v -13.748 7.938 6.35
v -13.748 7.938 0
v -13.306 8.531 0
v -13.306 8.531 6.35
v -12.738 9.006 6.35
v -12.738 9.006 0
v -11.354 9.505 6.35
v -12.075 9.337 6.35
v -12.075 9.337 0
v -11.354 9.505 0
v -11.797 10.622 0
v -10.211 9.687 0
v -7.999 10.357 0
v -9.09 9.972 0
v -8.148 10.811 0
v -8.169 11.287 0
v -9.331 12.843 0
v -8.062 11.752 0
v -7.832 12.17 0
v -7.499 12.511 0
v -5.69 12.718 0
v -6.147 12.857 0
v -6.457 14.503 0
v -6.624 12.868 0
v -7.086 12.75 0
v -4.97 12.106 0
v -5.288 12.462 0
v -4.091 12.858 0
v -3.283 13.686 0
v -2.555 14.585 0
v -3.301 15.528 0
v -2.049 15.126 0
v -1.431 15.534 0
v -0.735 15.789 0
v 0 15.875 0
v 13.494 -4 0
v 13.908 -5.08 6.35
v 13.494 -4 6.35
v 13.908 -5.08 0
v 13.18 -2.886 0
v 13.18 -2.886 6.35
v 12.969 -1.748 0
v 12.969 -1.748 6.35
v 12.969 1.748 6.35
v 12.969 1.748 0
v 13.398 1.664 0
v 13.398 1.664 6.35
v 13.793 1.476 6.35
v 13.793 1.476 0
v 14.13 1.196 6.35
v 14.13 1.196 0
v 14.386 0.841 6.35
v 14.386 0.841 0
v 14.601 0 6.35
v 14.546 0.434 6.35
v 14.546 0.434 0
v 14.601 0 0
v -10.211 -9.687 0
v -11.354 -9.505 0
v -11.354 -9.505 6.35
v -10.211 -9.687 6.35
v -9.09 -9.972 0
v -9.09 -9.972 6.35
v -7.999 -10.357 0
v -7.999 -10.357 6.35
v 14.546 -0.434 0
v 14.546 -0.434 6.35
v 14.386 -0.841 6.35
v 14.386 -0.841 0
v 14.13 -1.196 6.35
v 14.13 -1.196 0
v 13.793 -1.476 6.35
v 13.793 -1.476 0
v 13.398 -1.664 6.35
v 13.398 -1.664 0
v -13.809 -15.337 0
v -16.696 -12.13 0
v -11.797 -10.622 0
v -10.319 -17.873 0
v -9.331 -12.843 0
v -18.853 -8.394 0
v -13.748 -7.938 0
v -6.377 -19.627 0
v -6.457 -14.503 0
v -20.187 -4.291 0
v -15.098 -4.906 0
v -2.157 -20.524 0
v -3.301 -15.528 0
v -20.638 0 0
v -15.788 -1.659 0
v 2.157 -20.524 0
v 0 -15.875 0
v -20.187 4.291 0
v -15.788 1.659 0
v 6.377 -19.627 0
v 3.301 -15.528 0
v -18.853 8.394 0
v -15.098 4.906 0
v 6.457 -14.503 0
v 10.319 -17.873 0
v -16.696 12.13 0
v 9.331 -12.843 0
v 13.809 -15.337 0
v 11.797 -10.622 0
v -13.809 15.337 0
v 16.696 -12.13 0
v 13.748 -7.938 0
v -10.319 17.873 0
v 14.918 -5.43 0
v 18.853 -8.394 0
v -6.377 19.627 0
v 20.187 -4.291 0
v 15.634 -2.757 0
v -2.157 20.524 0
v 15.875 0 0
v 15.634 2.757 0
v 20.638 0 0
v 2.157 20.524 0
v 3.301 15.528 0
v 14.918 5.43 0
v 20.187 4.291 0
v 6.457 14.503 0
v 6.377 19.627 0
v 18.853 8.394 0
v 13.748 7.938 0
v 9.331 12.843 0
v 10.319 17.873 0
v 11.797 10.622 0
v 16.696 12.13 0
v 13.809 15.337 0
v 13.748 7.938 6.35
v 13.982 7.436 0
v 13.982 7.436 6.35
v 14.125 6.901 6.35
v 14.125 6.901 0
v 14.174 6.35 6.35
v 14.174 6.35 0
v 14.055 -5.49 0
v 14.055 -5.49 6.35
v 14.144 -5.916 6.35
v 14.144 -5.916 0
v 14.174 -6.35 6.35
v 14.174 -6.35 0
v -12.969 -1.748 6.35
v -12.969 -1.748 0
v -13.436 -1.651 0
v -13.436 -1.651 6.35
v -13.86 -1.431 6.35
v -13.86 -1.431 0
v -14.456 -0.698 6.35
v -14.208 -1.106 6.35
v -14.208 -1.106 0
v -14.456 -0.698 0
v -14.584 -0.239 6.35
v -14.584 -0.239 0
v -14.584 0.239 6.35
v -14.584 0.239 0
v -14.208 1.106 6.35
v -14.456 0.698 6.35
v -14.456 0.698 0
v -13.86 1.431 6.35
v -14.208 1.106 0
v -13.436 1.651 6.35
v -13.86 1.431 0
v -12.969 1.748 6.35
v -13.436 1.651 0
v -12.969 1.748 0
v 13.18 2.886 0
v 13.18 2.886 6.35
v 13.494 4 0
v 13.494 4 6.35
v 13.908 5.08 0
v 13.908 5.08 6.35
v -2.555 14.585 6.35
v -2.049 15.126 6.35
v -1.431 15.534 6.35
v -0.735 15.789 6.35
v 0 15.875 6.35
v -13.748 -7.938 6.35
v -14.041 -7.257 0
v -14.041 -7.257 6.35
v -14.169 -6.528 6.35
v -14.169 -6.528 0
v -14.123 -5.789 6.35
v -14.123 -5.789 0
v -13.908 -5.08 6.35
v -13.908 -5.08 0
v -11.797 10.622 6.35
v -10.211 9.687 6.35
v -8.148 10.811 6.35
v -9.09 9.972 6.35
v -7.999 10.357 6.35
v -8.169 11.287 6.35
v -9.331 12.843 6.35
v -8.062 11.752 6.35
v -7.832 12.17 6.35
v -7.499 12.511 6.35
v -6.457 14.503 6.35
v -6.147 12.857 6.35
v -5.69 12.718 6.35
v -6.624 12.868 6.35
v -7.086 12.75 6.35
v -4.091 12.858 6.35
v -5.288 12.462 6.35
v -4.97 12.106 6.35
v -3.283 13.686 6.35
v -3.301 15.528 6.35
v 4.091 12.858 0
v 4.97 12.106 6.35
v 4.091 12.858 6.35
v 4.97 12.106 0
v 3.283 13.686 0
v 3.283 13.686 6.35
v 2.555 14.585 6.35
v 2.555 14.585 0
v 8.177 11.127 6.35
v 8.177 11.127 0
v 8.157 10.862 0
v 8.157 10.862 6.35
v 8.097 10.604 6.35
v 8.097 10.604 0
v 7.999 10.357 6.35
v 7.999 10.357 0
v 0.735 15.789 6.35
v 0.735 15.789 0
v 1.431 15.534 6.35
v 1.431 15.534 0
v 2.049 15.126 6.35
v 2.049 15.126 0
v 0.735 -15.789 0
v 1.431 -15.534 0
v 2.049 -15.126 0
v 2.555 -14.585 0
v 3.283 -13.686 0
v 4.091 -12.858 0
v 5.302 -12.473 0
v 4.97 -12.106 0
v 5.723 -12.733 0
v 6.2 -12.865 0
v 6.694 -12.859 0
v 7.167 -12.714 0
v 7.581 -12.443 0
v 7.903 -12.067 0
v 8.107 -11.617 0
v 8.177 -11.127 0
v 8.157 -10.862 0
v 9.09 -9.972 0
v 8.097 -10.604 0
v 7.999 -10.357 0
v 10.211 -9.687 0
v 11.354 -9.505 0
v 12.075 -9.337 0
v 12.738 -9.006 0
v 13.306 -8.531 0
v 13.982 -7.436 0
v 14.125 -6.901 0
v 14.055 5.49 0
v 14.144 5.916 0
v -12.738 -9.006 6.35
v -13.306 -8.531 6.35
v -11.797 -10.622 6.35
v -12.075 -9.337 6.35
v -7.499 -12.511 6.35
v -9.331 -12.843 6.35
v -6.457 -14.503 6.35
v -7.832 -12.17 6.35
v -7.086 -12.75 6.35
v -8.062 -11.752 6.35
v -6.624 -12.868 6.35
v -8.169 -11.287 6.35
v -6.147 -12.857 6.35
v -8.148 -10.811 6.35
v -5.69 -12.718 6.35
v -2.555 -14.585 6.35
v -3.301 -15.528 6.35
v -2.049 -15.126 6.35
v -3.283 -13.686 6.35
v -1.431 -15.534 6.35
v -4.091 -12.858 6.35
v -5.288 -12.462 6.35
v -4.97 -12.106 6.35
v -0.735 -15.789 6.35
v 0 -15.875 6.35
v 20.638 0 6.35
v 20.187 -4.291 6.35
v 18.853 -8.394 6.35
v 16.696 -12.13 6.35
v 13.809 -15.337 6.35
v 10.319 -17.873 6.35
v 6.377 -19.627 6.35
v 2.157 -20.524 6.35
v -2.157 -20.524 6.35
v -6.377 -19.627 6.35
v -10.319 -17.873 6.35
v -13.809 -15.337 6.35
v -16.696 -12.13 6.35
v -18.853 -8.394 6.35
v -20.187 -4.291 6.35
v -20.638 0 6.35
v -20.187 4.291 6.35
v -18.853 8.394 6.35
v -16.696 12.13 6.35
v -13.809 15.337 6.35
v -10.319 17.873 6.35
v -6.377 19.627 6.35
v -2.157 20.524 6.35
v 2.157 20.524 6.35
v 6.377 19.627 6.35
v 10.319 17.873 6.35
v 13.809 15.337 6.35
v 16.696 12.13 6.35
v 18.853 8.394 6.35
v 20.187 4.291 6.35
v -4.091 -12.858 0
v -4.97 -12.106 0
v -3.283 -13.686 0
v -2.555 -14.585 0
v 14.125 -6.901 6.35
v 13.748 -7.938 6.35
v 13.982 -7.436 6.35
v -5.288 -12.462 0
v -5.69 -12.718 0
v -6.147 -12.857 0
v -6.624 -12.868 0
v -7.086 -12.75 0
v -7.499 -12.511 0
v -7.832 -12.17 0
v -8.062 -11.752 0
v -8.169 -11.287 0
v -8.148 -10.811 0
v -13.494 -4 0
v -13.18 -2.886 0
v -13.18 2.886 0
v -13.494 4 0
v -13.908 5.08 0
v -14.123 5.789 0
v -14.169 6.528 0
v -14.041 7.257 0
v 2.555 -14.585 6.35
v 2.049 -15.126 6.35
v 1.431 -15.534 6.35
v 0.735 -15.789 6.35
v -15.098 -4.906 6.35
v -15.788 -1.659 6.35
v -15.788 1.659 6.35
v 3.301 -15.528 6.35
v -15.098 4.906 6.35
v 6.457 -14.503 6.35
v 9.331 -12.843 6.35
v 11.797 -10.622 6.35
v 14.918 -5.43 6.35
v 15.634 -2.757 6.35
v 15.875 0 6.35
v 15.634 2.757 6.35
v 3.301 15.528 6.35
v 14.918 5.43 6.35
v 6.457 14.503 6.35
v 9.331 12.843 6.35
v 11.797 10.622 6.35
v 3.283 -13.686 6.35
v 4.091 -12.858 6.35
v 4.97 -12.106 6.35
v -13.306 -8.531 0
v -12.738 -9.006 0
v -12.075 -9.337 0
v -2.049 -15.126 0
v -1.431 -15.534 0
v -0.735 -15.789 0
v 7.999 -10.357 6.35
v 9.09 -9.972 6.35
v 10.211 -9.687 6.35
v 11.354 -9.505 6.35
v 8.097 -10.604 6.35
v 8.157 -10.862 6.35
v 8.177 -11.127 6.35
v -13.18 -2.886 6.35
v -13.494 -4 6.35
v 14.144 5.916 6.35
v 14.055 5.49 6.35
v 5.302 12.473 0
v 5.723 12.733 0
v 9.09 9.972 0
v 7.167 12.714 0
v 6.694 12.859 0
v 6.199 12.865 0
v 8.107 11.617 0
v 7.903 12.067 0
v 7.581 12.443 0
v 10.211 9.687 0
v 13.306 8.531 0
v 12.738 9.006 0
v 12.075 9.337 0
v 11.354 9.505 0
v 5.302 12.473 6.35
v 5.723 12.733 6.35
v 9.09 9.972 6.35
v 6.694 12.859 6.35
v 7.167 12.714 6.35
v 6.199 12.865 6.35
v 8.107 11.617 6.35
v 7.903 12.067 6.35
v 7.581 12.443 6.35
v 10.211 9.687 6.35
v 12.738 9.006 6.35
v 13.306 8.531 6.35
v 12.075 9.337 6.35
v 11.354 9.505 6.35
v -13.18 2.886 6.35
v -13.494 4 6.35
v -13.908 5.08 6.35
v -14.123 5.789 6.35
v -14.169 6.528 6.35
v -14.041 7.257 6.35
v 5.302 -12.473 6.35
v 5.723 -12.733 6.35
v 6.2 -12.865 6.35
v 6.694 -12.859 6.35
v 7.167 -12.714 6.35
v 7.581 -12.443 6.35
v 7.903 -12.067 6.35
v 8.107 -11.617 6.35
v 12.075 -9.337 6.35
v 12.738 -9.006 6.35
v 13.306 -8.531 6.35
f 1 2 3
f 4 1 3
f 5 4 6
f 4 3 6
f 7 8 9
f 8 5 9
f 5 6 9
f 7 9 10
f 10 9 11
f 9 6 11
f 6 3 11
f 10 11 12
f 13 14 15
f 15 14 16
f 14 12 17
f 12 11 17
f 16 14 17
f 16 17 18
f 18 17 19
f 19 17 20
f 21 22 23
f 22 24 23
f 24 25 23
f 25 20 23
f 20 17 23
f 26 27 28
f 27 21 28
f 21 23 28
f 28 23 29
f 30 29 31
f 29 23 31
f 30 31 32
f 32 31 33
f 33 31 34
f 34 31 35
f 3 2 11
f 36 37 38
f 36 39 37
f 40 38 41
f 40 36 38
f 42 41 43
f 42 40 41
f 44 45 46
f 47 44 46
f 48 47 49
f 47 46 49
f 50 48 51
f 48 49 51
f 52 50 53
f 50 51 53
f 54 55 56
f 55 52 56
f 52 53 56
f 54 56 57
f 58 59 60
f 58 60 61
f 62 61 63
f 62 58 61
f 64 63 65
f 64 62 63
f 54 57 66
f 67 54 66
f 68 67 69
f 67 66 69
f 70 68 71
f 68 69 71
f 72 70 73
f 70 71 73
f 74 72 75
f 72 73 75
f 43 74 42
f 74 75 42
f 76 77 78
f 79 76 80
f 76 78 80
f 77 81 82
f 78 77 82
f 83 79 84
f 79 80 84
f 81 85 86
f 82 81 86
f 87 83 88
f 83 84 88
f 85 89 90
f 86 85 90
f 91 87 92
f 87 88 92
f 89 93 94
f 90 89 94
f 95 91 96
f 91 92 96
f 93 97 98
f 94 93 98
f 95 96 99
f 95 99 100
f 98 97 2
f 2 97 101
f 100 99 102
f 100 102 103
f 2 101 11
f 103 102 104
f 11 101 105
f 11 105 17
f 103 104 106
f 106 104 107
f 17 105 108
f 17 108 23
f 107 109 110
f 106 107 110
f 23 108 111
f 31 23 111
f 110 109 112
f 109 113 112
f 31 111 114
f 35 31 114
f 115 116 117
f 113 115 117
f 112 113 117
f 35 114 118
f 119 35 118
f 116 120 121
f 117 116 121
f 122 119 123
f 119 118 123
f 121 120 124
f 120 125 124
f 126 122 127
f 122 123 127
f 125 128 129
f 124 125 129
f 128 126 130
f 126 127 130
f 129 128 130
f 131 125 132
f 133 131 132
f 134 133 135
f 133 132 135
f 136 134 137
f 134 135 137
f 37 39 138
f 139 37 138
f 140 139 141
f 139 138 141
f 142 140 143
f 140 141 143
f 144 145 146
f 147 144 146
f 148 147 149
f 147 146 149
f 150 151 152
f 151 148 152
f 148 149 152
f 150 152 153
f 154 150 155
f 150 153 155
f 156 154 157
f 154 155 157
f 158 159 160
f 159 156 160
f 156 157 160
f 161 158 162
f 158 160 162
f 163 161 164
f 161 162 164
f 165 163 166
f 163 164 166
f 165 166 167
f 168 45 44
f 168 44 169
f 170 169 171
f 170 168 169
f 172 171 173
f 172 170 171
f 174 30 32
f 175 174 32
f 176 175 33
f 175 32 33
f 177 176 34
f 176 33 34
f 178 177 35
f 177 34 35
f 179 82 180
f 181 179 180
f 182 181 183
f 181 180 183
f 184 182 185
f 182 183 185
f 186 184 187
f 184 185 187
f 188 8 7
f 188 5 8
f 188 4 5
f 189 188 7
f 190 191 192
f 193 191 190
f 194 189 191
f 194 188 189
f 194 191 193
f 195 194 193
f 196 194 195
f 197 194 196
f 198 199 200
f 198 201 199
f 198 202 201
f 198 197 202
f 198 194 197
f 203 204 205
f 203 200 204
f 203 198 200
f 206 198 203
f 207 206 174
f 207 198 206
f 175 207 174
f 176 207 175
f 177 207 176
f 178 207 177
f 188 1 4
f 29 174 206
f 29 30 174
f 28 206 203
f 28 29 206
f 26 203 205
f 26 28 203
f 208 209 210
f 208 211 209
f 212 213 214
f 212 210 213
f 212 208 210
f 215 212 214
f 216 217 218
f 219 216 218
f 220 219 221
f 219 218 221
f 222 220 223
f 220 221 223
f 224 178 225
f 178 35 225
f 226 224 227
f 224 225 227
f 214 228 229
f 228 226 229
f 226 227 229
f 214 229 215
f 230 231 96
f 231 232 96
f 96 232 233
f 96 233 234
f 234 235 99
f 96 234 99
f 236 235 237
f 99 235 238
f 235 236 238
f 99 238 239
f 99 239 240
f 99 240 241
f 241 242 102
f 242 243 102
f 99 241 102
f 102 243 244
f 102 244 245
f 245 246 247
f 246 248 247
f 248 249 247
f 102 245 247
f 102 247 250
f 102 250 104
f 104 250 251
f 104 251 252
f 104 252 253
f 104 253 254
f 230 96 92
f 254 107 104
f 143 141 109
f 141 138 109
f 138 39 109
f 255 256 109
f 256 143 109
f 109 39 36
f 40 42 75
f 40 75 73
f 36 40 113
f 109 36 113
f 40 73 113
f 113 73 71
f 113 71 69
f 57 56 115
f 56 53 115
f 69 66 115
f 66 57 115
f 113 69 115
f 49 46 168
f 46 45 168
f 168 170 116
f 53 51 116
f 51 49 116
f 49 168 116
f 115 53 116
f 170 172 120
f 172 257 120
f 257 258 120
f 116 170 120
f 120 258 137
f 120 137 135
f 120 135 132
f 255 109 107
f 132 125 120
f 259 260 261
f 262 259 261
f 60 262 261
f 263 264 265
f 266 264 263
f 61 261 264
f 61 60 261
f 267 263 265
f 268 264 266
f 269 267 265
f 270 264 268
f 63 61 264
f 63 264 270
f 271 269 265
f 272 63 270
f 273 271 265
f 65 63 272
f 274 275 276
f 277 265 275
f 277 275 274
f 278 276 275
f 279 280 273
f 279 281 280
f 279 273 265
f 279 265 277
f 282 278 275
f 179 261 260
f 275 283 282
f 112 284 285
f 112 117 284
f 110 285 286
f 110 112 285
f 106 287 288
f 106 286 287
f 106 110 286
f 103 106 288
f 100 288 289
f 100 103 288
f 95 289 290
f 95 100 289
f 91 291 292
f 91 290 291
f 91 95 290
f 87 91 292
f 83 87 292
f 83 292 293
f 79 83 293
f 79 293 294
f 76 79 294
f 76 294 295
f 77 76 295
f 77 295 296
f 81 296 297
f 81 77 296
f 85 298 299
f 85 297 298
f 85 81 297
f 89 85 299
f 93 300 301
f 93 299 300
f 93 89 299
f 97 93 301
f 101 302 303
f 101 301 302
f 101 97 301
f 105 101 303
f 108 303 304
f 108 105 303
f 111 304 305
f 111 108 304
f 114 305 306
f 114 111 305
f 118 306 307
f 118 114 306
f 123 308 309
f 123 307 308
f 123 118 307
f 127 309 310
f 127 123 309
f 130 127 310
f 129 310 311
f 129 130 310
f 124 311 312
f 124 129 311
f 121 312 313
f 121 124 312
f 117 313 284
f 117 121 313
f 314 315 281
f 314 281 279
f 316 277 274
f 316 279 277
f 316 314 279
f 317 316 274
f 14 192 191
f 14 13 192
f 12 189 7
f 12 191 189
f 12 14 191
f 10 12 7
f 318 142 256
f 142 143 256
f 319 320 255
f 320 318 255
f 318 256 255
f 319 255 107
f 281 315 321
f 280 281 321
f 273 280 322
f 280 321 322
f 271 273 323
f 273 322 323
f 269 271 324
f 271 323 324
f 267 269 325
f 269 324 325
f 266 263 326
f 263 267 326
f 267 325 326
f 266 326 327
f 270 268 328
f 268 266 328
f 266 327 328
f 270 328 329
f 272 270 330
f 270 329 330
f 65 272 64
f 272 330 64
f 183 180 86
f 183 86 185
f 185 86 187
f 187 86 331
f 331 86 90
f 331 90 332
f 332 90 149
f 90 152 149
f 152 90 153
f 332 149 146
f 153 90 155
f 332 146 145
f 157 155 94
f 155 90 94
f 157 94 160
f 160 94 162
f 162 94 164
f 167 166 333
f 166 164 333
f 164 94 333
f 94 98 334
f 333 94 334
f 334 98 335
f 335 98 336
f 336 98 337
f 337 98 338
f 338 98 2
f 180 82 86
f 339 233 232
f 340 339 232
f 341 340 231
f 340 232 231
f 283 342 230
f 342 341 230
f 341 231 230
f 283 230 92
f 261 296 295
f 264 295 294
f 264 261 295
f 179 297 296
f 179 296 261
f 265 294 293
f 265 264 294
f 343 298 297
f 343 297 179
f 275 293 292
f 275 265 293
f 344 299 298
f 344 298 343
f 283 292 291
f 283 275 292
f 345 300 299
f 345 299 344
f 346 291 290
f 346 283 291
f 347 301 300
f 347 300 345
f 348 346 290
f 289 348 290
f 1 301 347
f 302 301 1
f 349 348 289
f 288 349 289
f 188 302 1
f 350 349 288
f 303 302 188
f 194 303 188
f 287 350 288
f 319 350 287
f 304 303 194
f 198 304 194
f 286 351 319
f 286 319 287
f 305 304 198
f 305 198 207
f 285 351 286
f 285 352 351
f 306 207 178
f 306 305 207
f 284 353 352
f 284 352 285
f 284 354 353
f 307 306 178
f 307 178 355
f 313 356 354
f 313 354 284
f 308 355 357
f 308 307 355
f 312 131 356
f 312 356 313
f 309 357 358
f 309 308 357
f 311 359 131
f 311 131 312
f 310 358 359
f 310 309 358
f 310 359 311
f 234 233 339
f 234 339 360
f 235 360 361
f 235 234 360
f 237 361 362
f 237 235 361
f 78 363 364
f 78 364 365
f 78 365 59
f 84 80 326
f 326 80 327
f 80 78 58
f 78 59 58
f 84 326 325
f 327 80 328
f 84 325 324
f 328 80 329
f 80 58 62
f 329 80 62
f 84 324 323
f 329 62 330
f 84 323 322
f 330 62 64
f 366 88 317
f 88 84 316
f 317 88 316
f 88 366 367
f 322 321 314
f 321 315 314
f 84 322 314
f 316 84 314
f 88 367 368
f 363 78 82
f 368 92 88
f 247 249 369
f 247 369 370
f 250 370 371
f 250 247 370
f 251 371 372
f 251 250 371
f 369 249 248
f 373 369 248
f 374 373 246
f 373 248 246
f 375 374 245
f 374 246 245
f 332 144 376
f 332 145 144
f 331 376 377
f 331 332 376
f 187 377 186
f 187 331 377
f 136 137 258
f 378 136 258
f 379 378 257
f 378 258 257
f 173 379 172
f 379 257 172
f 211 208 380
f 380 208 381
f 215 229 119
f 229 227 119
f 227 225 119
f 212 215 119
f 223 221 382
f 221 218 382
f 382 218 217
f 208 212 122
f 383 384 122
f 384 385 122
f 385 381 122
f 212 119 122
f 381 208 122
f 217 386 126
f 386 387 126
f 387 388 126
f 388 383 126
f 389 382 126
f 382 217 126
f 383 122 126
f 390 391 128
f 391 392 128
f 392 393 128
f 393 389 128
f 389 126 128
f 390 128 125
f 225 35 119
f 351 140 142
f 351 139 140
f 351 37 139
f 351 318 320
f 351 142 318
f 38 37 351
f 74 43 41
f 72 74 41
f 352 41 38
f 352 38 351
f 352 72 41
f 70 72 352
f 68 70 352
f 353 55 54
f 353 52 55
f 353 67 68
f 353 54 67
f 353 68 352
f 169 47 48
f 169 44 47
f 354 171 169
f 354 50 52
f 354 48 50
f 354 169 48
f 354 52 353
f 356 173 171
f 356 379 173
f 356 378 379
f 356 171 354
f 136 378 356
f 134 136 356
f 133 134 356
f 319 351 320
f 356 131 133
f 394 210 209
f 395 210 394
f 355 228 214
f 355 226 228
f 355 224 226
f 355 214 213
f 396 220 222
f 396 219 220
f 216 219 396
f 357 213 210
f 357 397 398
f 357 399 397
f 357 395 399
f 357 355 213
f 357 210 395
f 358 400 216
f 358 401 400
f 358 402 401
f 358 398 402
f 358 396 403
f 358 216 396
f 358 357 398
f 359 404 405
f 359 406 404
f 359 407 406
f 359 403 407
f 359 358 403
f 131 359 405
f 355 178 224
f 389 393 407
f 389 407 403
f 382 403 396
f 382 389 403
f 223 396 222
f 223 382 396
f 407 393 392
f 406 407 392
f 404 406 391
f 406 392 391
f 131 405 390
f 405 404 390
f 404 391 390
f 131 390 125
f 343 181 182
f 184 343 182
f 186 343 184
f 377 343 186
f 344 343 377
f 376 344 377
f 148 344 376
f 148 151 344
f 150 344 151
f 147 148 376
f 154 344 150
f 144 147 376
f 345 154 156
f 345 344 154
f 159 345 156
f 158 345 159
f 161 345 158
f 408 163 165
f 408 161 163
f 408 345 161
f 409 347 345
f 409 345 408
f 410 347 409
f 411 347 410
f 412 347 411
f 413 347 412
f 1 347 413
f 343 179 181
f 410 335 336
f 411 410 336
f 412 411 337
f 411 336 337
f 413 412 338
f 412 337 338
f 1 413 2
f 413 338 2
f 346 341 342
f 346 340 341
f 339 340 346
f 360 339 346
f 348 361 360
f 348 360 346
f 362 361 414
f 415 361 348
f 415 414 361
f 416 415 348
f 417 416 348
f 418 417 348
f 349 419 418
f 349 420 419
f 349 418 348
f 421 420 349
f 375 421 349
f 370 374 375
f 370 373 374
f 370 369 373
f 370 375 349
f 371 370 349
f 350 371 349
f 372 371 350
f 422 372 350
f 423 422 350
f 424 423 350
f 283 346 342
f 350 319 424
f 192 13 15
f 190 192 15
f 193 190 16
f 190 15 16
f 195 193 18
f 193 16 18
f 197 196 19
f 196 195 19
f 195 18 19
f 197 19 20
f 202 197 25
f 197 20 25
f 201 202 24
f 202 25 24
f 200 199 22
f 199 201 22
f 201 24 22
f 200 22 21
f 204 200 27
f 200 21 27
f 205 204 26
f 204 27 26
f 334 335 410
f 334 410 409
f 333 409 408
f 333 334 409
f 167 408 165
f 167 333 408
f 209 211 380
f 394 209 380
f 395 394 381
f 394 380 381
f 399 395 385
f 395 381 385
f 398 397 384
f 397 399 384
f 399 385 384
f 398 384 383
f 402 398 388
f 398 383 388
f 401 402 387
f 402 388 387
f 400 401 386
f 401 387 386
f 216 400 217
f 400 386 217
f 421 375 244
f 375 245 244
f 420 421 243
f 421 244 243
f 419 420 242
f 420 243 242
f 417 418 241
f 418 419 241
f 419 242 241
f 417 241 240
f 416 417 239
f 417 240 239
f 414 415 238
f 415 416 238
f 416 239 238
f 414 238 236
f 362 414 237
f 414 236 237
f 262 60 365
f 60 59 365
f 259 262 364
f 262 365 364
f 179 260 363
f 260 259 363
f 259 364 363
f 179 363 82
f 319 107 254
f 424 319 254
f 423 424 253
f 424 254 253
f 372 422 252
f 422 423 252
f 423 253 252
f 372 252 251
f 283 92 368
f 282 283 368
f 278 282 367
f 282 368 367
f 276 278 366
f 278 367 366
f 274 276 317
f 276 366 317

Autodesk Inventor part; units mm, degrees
ref_plane "YZ Plane" through (0, 0, 0) normal (1, 0, 0) x (0, 1, 0)
ref_plane "XZ Plane" through (0, 0, 0) normal (0, 1, 0) x (-1, 0, 0)
ref_plane "XY Plane" through (0, 0, 0) normal (0, 0, 1) x (1, 0, 0)
sketch "Sketch1" plane through (0, 0, 0) normal (0, 0, 1) x (1, 0, 0)
  circle A0 centre (0, 0) radius 20.6375
  circle A1 centre (0, 0) radius 7.9375 construction
  circle A2 centre (0, 0) radius 15.875
  line L0 (0, 0) -> (0, 20.6375) construction
  circle A3 centre (0, 0) radius 3.175 construction
  circle A4 centre (0, 12.7) radius 3.175
  line L1 (0, 12.7) -> (10.9985, 6.35) construction
  line L2 (10.9985, 6.35) -> (10.9985, -6.35) construction
  line L3 (10.9985, -6.35) -> (0, -12.7) construction
  line L4 (0, -12.7) -> (-10.9985, -6.35) construction
  line L5 (-10.9985, -6.35) -> (-10.9985, 6.35) construction
  line L6 (-10.9985, 6.35) -> (0, 12.7) construction
  circle A5 centre (10.9985, 6.35) radius 3.175
  arc A6 (2.5548, 14.5851) -> (11.3536, 9.5051) centre (12.7741, 22.1254) ccw
  arc A7 (-11.3536, 9.5051) -> (-2.5548, 14.5851) centre (-12.7741, 22.1254) ccw
  circle A8 centre (0, 12.7) radius 3.175
  arc A9 (-13.9085, -5.08) -> (-13.9085, 5.08) centre (-25.5482, 0) ccw
  circle A10 centre (-10.9985, 6.35) radius 3.175
  arc A11 (-2.5548, -14.5851) -> (-11.3536, -9.5051) centre (-12.7741, -22.1254) ccw
  circle A12 centre (-10.9985, -6.35) radius 3.175
  arc A13 (11.3536, -9.5051) -> (2.5548, -14.5851) centre (12.7741, -22.1254) ccw
  circle A14 centre (0, -12.7) radius 3.175
  arc A15 (13.9085, 5.08) -> (13.9085, -5.08) centre (25.5482, 0) ccw
  circle A16 centre (10.9985, -6.35) radius 3.175
  circle A17 centre (6.4241, -11.1269) radius 1.7526
  circle A18 centre (12.8482, 0) radius 1.7526
  circle A19 centre (6.4241, 11.1269) radius 1.7526
  circle A20 centre (-6.4241, 11.1269) radius 1.7526
  circle A21 centre (-12.8482, 0) radius 1.7526
  circle A22 centre (-6.4241, -11.1269) radius 1.7526
  point P0 (13.9085, 5.08)
  point P1 (11.3536, -9.5051)
  point P2 (-2.5548, -14.5851)
  point P3 (-13.9085, -5.08)
  point P4 (-11.3536, 9.5051)
  point P5 (-2.5548, 14.5851)
  point P6 (12.9691, 1.7484)
  point P7 (12.9691, -1.7484)
  point P8 (7.9987, -10.3574)
  point P9 (4.9704, -12.1058)
  point P10 (-4.9704, -12.1058)
  point P11 (-7.9987, -10.3574)
  point P12 (-12.9691, -1.7484)
  point P13 (-12.9691, 1.7484)
  point P14 (-7.9987, 10.3574)
  point P15 (-4.9704, 12.1058)
  point P16 (4.9704, 12.1058)
  point P17 (7.9987, 10.3574)
  dimension "d0" = 41.275
  dimension "d13" = 6.35
  dimension "d14" = 6.35
  dimension "d1" = 15.875
  dimension "d4" = 6.35
  dimension "d15" = 12.7
  dimension "d18" = 360
  dimension "d20" = 3.5052
  dimension "d23" = 360
  dimension "Brass_ID" = 31.75
extrude "Extrusion1" add sketch "Sketch1" along normal blind 6.35 contours A0 | A2 A16 A15 A18 A5 | A5 A6 A19 A4 A2 | A2 A14 A13 A17 A16 | A4 A7 A20 A10 A2 | A2 A12 A11 A22 A14 | A10 A9 A21 A12 A2
equation "\"d0\" = Brass_OD"
equation "\"Brass_OD\" = 41.275"
properties part number "Brass Gryo" material "Brass, Soft Yellow"
